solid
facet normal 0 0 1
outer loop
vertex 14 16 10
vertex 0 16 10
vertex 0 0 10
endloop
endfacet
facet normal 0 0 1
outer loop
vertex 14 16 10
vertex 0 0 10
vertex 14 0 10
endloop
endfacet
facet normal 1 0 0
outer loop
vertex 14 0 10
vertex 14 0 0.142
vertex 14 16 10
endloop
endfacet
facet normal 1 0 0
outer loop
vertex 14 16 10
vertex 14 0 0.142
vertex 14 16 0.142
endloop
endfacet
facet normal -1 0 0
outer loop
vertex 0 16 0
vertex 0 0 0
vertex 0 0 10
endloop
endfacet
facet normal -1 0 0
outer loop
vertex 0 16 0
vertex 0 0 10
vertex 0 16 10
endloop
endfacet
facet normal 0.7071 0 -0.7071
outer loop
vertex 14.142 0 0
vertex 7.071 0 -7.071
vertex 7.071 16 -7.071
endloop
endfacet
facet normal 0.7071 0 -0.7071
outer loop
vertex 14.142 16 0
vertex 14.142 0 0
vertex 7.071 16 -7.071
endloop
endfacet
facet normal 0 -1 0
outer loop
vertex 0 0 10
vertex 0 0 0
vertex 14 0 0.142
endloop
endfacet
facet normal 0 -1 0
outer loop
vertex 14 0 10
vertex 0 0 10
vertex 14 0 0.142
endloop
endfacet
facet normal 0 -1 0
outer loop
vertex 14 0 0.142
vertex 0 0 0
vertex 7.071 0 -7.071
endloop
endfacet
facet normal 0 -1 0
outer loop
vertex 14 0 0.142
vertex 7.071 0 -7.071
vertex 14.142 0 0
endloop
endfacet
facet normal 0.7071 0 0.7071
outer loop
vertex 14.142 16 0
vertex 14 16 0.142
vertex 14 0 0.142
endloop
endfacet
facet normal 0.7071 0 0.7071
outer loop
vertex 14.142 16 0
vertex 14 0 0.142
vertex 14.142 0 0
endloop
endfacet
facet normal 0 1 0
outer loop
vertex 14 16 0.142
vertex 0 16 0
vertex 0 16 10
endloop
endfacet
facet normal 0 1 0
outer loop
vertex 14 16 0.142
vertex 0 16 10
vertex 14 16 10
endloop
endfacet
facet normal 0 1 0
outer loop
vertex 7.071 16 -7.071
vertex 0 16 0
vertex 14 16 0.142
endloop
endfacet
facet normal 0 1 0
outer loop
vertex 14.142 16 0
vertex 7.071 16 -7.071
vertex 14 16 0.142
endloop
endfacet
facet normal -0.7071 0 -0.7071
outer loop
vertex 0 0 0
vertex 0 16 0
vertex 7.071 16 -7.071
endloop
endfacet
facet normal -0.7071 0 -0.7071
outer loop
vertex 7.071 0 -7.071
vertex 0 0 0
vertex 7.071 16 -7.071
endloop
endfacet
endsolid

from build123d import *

# Parameters (mm, degrees)
BOX_W                  = 14
BOX_H                  = 16
BOX_DEPTH              = 10
BOX001_W               = 10
BOX001_H               = 16
BOX001_DEPTH           = 10
BOX001_PLACEMENT_ANGLE = 45


with BuildPart() as cub:
    # Box → Box (new body)
    with BuildSketch(Plane.XY):
        with Locations((7, 8)):
            Rectangle(BOX_W, BOX_H)
    extrude(amount=BOX_DEPTH)


with BuildPart() as fusion:
    # Box001 → Box001 (new body)
    with BuildSketch(Plane.XY):
        with Locations((5, 8)):
            Rectangle(BOX001_W, BOX001_H)
    extrude(amount=BOX001_DEPTH)


with BuildPart() as fusion_1:
    # Box001 placement: moved
    add(fusion.part.rotate(Axis((0, 0, 0), (0, 1, 0)), BOX001_PLACEMENT_ANGLE))

    # Fusion: union Cub
    add(cub.part)


solid = fusion_1.part
